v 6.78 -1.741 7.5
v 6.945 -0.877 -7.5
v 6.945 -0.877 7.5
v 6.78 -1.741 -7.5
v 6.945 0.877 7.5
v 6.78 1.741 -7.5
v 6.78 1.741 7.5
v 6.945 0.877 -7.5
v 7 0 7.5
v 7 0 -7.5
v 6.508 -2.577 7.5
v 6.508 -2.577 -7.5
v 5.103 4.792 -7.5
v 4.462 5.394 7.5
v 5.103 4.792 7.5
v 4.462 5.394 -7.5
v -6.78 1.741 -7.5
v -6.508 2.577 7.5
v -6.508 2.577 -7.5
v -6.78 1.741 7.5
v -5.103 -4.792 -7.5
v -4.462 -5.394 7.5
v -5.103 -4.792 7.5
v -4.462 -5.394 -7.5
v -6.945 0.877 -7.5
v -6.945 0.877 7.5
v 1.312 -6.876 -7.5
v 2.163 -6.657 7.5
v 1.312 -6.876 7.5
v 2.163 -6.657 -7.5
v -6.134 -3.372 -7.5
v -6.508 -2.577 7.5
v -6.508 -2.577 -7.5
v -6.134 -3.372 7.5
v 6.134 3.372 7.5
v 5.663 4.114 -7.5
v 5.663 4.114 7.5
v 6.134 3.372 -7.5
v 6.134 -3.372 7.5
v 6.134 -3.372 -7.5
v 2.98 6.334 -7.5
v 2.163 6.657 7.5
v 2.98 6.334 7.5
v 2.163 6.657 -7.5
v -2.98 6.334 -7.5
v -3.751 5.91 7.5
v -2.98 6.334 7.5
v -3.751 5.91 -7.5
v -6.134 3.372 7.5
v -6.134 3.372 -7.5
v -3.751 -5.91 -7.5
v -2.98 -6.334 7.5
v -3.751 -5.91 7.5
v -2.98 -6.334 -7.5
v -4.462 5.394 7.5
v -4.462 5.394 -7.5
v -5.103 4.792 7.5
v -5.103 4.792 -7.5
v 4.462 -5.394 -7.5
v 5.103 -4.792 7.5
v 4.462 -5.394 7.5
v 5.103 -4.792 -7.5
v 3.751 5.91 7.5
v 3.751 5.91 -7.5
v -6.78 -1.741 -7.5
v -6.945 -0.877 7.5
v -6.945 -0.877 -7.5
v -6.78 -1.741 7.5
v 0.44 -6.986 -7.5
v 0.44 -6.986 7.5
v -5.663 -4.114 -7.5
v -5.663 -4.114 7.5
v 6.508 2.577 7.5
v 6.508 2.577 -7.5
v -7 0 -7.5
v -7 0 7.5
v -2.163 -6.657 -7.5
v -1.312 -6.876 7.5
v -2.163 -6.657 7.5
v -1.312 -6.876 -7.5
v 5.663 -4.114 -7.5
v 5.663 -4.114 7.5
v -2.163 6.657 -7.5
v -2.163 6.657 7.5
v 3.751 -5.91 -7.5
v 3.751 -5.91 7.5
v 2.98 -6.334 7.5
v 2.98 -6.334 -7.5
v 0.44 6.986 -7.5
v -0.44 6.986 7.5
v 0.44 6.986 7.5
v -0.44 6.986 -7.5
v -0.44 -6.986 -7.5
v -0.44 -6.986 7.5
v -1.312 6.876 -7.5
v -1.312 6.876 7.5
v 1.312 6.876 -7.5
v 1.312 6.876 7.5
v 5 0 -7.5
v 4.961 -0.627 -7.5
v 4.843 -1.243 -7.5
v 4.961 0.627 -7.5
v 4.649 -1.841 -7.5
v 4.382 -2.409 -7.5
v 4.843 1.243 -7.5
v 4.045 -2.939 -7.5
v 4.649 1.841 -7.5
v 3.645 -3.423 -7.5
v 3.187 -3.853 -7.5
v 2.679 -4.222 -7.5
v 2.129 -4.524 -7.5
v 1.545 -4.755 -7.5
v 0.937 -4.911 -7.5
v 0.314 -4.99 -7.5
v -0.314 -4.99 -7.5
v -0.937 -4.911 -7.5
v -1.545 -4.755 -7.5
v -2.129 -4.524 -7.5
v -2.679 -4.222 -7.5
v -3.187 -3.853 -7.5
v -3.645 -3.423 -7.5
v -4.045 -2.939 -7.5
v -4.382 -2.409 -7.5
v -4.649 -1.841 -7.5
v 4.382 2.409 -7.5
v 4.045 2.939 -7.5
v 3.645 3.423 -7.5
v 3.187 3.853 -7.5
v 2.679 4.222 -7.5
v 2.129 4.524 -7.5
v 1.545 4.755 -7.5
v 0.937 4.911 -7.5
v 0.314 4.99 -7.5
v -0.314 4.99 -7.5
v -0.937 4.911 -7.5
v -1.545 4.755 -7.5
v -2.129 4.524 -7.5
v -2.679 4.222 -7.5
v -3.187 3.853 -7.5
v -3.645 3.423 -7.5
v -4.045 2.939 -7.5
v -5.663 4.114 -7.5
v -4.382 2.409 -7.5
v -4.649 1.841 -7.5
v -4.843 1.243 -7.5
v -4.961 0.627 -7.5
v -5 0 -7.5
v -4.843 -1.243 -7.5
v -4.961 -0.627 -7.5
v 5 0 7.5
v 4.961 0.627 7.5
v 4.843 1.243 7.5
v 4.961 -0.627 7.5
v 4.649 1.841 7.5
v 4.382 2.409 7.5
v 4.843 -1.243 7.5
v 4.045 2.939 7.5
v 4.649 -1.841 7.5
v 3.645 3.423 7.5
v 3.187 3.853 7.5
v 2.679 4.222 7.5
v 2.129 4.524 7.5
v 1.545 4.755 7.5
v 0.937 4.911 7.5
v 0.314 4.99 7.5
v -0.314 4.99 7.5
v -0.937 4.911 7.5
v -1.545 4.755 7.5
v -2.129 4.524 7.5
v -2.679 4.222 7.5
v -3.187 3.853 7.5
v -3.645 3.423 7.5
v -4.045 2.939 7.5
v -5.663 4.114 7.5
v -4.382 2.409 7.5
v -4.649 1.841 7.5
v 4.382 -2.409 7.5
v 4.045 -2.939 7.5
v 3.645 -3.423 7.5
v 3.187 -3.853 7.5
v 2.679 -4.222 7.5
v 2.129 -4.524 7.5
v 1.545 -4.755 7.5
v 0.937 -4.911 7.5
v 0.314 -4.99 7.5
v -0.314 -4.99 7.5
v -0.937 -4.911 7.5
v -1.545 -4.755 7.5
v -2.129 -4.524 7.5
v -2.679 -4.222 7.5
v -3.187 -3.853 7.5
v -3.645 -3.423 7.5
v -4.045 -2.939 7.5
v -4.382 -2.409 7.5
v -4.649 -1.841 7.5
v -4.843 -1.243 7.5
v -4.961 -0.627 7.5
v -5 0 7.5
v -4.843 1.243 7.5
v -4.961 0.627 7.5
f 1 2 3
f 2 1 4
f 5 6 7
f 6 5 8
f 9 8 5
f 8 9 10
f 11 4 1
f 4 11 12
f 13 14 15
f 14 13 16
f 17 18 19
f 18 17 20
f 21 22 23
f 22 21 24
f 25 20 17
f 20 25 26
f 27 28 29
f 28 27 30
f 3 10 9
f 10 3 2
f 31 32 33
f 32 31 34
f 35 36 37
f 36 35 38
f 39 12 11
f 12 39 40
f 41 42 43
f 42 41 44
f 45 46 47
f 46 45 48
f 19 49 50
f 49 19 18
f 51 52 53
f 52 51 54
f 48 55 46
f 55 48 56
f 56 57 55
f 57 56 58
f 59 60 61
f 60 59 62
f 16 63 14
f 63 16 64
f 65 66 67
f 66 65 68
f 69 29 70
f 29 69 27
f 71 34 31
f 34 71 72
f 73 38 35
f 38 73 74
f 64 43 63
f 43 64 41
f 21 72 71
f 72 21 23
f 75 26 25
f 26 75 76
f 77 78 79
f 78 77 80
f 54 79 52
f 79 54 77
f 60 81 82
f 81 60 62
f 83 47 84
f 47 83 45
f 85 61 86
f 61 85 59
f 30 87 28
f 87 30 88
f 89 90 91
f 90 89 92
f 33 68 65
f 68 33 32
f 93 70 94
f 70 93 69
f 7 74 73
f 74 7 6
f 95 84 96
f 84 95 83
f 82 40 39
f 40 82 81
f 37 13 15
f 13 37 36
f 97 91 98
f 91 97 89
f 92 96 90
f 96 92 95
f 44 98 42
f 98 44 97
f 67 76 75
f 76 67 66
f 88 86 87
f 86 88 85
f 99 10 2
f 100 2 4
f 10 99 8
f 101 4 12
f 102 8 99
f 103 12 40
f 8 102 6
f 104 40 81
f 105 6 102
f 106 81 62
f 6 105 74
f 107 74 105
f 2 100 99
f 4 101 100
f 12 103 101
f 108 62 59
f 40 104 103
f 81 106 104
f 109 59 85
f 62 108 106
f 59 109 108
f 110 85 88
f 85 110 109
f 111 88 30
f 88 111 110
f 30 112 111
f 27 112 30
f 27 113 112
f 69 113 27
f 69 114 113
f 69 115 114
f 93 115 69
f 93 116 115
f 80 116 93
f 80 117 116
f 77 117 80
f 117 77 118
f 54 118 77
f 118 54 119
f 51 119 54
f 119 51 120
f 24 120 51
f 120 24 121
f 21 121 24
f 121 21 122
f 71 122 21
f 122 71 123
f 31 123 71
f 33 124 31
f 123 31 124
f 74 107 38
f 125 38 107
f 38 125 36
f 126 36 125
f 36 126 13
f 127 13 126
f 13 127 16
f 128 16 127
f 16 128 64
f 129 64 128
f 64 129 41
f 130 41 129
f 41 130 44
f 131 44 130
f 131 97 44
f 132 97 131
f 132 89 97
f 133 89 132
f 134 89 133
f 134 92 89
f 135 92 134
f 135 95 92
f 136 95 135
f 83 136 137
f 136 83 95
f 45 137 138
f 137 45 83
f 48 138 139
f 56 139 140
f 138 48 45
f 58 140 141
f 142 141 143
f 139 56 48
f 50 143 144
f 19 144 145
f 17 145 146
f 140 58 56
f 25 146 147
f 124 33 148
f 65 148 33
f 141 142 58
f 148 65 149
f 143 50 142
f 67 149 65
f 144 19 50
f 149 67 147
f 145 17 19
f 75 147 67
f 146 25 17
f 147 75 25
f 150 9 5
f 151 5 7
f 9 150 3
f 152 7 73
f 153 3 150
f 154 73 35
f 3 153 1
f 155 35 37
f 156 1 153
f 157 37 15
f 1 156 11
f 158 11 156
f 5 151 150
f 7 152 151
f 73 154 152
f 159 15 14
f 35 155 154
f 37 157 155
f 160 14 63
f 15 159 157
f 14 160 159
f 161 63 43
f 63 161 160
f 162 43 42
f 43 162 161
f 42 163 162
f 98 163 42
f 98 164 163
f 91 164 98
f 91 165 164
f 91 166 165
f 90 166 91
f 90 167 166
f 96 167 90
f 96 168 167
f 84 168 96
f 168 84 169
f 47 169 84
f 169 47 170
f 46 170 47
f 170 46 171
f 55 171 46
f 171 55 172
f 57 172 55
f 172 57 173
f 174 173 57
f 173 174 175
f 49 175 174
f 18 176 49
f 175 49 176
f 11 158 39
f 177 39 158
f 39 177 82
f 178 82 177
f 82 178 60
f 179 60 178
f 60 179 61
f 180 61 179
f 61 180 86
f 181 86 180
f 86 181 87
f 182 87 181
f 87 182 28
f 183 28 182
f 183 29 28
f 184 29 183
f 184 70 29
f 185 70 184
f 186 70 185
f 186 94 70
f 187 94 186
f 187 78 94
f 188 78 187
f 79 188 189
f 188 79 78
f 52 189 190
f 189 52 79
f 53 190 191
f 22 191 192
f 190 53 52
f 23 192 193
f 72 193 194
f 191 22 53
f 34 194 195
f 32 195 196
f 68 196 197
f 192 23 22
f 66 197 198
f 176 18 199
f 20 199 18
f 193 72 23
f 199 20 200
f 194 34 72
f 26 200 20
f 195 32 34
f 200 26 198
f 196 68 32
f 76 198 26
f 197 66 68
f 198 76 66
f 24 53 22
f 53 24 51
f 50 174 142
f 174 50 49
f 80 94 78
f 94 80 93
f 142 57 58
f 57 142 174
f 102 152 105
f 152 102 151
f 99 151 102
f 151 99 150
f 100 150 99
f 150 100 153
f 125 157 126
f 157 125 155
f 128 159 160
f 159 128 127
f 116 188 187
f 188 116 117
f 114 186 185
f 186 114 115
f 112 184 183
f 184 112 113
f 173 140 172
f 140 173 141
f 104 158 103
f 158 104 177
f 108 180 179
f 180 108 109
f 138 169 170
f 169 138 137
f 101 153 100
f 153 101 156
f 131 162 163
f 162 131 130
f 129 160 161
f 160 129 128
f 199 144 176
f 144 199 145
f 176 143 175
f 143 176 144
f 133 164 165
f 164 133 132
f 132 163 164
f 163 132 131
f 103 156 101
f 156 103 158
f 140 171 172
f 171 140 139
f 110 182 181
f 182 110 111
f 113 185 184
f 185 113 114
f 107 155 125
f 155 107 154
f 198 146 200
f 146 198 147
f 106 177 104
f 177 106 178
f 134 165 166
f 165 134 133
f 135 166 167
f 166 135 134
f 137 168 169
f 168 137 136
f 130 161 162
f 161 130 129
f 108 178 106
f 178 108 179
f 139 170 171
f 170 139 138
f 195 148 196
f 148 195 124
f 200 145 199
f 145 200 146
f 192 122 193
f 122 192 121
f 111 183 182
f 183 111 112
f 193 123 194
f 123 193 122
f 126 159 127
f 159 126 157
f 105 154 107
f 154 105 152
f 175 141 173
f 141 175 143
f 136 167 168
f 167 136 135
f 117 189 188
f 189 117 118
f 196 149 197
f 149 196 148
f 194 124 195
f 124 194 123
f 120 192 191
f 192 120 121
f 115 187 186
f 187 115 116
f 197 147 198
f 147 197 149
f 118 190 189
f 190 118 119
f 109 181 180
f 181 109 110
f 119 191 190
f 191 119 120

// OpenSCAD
$fn = 50;


difference() {
	union() {
		translate(v = [0, 0, -7.5000000000]) {
			cylinder(h = 15, r = 7.0000000000);
		}
	}
	union() {
		translate(v = [0, 0, -100.0000000000]) {
			cylinder(h = 200, r = 5.0000000000);
		}
	}
}
